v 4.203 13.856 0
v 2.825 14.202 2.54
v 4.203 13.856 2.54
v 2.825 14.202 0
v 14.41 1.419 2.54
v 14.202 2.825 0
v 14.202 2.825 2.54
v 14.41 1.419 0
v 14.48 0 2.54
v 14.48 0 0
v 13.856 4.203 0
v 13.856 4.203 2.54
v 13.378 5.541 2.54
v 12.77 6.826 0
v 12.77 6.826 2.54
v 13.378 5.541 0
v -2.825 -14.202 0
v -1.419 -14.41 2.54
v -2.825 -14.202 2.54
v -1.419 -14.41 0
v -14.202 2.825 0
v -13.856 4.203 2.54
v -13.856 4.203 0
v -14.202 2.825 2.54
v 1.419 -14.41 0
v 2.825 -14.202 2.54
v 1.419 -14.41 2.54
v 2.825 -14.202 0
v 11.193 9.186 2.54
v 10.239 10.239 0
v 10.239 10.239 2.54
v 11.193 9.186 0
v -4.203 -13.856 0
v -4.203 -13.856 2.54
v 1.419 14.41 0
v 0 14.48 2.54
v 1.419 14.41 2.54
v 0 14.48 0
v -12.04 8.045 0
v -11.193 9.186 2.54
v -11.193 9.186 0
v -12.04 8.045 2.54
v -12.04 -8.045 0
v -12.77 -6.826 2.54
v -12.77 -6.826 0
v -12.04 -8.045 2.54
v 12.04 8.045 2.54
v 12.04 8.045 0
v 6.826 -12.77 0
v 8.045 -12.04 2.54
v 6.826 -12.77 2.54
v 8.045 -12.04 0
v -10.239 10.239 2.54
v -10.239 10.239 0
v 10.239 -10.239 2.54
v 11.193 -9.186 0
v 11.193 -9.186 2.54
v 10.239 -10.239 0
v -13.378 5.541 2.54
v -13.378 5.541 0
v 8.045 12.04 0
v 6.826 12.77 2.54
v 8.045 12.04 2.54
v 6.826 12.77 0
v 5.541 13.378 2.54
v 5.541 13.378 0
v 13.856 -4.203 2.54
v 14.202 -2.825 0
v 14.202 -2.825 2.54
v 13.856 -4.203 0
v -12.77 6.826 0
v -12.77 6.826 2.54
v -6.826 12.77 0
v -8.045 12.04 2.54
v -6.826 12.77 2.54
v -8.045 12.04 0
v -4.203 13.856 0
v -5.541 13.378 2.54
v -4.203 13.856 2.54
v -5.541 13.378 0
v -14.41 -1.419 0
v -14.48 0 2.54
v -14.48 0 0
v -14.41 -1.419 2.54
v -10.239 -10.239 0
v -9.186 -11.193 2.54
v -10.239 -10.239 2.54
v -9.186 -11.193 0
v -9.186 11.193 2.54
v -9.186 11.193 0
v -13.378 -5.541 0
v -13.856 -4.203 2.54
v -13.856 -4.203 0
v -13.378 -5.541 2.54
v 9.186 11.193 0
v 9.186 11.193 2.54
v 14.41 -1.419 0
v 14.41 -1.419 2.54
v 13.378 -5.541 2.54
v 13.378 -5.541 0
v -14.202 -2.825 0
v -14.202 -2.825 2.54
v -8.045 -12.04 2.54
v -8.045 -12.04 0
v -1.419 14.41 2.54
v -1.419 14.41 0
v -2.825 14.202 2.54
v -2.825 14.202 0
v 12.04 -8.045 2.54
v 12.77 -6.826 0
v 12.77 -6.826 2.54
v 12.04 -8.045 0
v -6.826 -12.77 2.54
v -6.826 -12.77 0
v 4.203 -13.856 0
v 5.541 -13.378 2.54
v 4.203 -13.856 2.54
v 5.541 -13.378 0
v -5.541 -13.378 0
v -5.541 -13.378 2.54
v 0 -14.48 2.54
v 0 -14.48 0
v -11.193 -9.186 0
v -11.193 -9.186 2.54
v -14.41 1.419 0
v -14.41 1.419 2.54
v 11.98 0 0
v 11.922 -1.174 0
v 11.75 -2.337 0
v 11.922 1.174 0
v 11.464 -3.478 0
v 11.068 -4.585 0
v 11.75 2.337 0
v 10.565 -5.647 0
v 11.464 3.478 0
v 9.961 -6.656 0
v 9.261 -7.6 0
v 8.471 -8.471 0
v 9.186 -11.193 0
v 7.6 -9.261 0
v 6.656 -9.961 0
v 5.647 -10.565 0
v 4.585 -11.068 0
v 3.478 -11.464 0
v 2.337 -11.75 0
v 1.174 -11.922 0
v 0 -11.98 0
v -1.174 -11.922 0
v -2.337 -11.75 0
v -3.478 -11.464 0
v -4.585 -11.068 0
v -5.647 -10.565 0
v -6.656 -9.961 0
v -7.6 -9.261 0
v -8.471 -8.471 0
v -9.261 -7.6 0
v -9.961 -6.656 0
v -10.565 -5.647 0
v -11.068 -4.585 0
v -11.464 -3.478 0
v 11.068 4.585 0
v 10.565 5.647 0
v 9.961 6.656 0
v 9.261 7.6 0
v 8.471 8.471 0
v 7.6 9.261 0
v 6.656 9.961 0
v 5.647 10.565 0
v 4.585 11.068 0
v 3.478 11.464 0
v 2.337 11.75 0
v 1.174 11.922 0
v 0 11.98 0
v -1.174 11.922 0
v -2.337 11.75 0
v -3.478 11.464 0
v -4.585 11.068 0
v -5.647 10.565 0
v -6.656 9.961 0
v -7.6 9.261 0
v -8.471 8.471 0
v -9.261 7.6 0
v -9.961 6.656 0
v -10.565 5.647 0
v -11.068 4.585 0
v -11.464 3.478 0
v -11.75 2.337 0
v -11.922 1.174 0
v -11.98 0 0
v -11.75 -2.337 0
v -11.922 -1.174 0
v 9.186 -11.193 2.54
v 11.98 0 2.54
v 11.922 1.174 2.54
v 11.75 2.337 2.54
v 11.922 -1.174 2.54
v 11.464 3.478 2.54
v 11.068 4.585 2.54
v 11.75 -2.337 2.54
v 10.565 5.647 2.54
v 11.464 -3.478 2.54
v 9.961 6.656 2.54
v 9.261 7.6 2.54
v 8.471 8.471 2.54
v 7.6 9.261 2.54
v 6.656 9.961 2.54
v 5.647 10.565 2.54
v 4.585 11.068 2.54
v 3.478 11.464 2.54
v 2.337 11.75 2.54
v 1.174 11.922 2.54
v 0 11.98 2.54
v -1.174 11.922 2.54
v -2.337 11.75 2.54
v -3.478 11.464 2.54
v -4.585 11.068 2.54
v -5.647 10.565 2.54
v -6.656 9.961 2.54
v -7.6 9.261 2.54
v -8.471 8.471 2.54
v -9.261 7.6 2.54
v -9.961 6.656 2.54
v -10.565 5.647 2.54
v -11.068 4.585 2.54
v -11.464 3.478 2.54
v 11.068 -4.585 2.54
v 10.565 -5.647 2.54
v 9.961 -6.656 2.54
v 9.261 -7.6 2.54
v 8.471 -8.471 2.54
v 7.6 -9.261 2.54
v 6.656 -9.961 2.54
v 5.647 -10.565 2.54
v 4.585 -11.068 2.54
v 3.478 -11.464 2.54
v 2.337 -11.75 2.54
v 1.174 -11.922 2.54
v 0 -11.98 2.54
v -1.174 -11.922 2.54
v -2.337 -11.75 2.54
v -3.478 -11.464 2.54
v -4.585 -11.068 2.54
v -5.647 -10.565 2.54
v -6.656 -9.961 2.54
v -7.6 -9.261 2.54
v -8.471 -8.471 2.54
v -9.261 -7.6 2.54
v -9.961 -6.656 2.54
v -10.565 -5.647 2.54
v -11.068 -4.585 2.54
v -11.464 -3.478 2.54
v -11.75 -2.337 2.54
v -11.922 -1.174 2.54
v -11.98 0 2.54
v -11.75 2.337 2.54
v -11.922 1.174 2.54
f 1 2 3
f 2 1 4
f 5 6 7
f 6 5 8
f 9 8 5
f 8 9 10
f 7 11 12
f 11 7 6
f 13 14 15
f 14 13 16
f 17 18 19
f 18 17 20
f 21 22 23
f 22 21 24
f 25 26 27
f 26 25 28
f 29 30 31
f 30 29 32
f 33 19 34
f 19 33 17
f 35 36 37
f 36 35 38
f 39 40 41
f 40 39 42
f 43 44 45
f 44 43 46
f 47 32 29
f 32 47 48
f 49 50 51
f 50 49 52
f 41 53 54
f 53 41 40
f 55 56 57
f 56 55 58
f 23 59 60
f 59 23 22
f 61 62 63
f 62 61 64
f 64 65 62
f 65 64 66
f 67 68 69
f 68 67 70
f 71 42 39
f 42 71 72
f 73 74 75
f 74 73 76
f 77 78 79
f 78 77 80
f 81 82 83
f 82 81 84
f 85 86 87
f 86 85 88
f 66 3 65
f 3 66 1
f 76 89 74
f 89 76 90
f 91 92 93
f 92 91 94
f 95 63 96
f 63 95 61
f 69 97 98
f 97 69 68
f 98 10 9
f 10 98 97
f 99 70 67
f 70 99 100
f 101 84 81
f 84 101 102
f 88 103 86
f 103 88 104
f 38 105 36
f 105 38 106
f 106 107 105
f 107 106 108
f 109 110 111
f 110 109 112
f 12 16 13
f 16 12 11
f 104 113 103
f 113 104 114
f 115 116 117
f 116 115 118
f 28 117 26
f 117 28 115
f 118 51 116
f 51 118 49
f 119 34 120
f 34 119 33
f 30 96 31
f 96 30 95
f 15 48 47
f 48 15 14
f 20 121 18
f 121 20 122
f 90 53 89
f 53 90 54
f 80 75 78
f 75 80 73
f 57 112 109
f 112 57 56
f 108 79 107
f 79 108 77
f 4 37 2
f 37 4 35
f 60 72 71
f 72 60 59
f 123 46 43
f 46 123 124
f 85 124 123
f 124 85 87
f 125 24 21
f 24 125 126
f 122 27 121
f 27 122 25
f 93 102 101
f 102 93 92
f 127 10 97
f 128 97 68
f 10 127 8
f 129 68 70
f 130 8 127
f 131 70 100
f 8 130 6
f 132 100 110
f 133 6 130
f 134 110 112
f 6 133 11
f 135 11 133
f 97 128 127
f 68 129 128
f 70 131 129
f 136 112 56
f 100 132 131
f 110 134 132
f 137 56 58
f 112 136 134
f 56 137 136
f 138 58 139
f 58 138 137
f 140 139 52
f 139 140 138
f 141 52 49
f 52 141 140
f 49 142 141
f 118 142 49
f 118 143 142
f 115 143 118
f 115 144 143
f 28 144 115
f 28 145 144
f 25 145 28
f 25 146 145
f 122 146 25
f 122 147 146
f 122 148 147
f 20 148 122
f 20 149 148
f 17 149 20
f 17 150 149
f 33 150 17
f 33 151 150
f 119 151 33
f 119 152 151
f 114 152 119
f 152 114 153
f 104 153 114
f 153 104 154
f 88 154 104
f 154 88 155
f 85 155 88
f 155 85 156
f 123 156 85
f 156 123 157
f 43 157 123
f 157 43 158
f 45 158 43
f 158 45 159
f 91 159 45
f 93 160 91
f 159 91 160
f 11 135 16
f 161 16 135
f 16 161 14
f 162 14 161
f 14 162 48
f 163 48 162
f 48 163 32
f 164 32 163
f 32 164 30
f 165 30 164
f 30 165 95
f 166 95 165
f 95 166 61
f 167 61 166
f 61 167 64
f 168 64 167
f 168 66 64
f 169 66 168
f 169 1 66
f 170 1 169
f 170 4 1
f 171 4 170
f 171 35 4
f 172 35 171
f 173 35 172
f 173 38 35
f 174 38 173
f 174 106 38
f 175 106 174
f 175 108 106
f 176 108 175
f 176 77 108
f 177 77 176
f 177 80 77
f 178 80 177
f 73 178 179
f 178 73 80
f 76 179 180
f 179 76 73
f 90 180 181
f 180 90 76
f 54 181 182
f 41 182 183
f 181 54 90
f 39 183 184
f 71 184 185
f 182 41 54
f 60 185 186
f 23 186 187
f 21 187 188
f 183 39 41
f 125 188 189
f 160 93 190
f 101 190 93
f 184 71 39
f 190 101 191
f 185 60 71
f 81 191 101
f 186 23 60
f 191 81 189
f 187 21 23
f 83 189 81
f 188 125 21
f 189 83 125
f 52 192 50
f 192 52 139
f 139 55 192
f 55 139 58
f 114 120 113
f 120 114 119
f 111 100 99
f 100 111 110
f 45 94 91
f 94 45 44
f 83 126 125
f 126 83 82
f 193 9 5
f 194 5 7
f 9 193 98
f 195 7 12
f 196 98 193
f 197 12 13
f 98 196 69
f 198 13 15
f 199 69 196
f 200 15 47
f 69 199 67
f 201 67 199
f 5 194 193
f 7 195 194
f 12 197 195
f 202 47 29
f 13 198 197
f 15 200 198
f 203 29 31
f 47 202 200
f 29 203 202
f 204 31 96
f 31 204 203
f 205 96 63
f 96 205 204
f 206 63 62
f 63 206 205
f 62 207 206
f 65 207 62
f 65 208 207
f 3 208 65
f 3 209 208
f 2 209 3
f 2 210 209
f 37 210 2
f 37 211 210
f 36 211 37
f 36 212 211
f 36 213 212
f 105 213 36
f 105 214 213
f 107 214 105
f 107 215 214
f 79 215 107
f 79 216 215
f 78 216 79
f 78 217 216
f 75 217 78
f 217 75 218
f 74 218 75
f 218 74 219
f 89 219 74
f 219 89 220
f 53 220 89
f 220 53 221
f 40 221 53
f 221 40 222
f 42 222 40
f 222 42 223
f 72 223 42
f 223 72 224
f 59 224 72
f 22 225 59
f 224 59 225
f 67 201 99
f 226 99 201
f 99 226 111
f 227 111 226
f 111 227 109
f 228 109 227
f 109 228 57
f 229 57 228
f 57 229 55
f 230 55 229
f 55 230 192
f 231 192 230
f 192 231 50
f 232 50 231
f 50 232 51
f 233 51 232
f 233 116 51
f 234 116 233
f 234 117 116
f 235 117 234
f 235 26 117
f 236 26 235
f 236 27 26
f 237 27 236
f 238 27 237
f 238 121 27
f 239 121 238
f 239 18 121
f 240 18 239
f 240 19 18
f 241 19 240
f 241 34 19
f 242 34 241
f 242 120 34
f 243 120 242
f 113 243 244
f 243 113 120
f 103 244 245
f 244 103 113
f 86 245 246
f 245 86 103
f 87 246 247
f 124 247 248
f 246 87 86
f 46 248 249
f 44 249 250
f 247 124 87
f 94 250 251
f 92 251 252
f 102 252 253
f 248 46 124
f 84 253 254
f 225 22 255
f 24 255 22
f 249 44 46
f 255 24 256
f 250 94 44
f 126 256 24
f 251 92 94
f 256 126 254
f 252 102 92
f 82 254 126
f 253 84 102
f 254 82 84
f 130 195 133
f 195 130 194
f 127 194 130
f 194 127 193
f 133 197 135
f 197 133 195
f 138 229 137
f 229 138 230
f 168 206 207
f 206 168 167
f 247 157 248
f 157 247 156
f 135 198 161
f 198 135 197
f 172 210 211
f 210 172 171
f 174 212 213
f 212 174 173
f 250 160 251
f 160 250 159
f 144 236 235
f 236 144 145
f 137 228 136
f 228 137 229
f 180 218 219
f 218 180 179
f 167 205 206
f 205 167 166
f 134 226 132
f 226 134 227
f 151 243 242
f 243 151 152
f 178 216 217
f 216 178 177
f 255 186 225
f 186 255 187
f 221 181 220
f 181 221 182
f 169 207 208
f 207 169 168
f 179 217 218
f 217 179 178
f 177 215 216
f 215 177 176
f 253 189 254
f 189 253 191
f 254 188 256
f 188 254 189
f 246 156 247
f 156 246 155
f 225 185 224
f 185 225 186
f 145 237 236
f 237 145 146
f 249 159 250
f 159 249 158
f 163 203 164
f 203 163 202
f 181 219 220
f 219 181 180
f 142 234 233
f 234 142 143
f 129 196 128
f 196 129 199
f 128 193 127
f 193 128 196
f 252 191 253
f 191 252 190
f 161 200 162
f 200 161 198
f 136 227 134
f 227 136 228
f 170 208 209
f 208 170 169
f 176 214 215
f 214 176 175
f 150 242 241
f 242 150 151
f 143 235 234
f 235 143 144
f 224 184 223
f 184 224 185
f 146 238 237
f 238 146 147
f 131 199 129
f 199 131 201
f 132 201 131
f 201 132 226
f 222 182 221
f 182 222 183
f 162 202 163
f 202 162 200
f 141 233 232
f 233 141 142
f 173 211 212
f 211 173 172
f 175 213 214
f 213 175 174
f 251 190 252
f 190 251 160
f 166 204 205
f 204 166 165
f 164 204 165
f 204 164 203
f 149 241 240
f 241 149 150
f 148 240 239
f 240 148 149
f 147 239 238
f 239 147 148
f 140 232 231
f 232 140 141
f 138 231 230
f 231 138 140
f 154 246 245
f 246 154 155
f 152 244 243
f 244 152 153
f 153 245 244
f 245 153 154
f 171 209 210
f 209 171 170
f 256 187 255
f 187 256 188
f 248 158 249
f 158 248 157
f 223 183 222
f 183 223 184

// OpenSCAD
// file: Fins.scad
include <Variables.scad>

// A Test to show the fin data was imported properly
//finForFinCan();

module finPolygon()
{
    // X is the width of the svg, y is the height of the svg
    translate(v = [finLength / 2, finSemiSpan / 2, 0])
    {
        scale([25.4 / 90, -25.4 / 90, 1]) 
        {
            polygon(finPoints);
        }
    }
}

module finCan(finCanLength = 50.8, finCanInsideDiameter = 28.96, finCanWallThickness = 0.885, finCount = 3, launchLugInsideDiameter = 3, launchLugWallThickness = 0.5, launchLugPieceLength = 10, launchLugNumberOfPieces = 2, launchLugWallThicknessOffsetPercentage = 100)
{
    // Calculate some distances
    launchLugTotalLength = launchLugNumberOfPieces * launchLugPieceLength;
    launchLugTotalGapLength = finCanLength - launchLugTotalLength;
    launchLugNumberOfGaps = (launchLugNumberOfPieces - 1);
    gapBetweenLaunchLugPieces = launchLugTotalGapLength / (launchLugNumberOfPieces - 1);
    
    difference()
    {
        union()
        {
            // Create the fin can
            cylinder(h = finCanLength, r = finCanInsideDiameter / 2 + finCanWallThickness);
            
            // Create the fins
            for(i = [0 : finCount - 1])
            {
                rotate([0, 0, i * (360 / finCount)])
                {
                    translate(v = [finCanInsideDiameter / 2 + finCanWallThickness, 0, 0])
                    {
                        finForFinCan(finDXFFileName = finFileName);
                    }
                }
            }
            
            // Add the launch lug
            for(i = [0 : launchLugNumberOfPieces - 1])
            {
                // Rotate the lug inbetween the fins
                rotate([0, 0, 180 / finCount])
                {
                    // Move the lug to the edge of the fin can + the offset
                    translate([finCanInsideDiameter / 2 + finCanWallThickness + launchLugInsideDiameter / 2 + (launchLugWallThicknessOffsetPercentage / 100) * launchLugWallThickness - offsetMargin, 0, i * gapBetweenLaunchLugPieces + i * launchLugPieceLength])
                    {
                        difference()
                        {
                            // Launch Lug Body
                            cylinder(h = launchLugPieceLength, r = launchLugInsideDiameter / 2 + launchLugWallThickness);
                            
                            // Launch lug cutout
                            translate(v = [0, 0, -offsetMargin])
                            {
                                cylinder(h = launchLugPieceLength + 2 * offsetMargin, r = launchLugInsideDiameter / 2);
                            }
                        }
                    }
                }
            }
        }
        
        // Fin can cutout
        translate(v = [0, 0, -offsetMargin])
        {
            cylinder(h = finCanLength + 2 * offsetMargin, r = finCanInsideDiameter / 2);
        }
    }
}

module finForFinCan(finThickness = 1)
{
    translate(v = [-offsetMargin, finThickness / 2, finRootChordLength])
    {
        rotate(a = [90, 90, 0])
        {
            linear_extrude(height = finThickness)
            {
                finPolygon();
            }
        }
    }
}

module finsForPrinting(finThickness = 1, finCount = 4, finXSpacing = 25, finYSpacing = 25, maxFinsInXDirection = 2, maxFinsInYDirection = 2, finLayout = [[1, 1], [1, 1]])
{
    for(i = [0 : maxFinsInXDirection - 1])
    {
        for(i2 = [0 : maxFinsInYDirection - 1])
        {
//            echo("i2", i2);
//            echo("i", i);
//            echo("finLayout[][]:", finLayout[i2][i]);
            if(finLayout[i2][i] == 1 || finLayout == true)
            {
                translate(v = [i * finXSpacing, i2 * finYSpacing, 0])
                {
                    linear_extrude(height = finThickness)
                    {
                        finPolygon();
                    }
                }
            }
        }
    }
}
// file: NoseCone.scad
include <Variables.scad>

// A Test to show the nose cone was imported properly
/*rotate_extrude(convexity = 10)
{
    noseConePolygon();
}*/

module noseConePolygon()
{
    // Rotate to the proper orientation for a rotate_extrude
    rotate(a = [180, 180, 90])
    {
        // X is the width of the svg, y is the height of the svg
        translate(v = [-noseConeTotalLength / 2, noseConeWidth / 4, 0])
        {
            scale([25.4 / 90, -25.4 / 90, 1]) 
            {
                polygon(noseConePoints);
            }
        }
    }
}

module noseCone(wallThickness = 1.17, addParachuteAttachmentHook = true, parachuteAttachmentHookSize = 5.0)
{
    scalePercentage = (noseConeWidth / 2 - wallThickness) / (noseConeWidth / 2);
    
    union()
    {
        // Create the nose cone
        difference()
        {
            // Create the nose Cone
            rotate_extrude(convexity = 10)
            {
                noseConePolygon();
            }
            
            // Cutout the inside of the nose cone
            rotate_extrude(convexity = 10)
            {
                scale([scalePercentage, scalePercentage, scalePercentage])
                {
                    noseConePolygon();
                }
            }
            
            // Cutout plength of shoulder length so a clean bottom can be added back in
            translate(v = [0, 0, -offsetMargin])
            {
                cylinder(r = noseConeShoulderWidth / 2 - wallThickness, h = wallThickness + 2 * offsetMargin);
            }
        }
        
        
        // Create the bottom face of the nose cone
        difference()
        {
            // Add back the bottom of the nose cone
            cylinder(r = noseConeShoulderWidth / 2, h = wallThickness);
            
            // Create the cutout for the parachuteHook
            if(addParachuteAttachmentHook)
            {
                translate(v = [0, 0, -offsetMargin])
                {
                    cylinder(r = parachuteAttachmentHookSize / 2, h = wallThickness + 2 * offsetMargin);
                }
            }
        }
        
        // Create the parachute attatchment hook
        if(addParachuteAttachmentHook)
        {
            // Move the hook on top of the bottom plate
            translate(v = [0, wallThickness / 2, 0])
            {
                rotate(a = [90, 0, 0])
                {
                    difference()
                    {
                        // Create the main cylinder
                        translate(v = [0, wallThickness, 0])
                        {
                            cylinder(r = parachuteAttachmentHookSize / 2 + wallThickness, h = wallThickness);
                        }
                        
                        // Main cylinder cutout
                        translate(v = [0, wallThickness, -offsetMargin])
                        {
                            cylinder(r = parachuteAttachmentHookSize / 2, h = wallThickness + 2 * offsetMargin);
                        }
                        // Cut off the bottom of the cylinder
                        translate(v = [-parachuteAttachmentHookSize - wallThickness - offsetMargin, -parachuteAttachmentHookSize - wallThickness - offsetMargin, -offsetMargin])
                        {
                            cube(size = [parachuteAttachmentHookSize * 2 + wallThickness * 2 + offsetMargin * 2, parachuteAttachmentHookSize + 2 * wallThickness + offsetMargin, wallThickness + 2 * offsetMargin]);
                        }
                    }
                }
            }
        }
    }
}
// main file
include <Variables.scad>
include <NoseCone.scad>
include <Fins.scad>

//translate(v = [0, 0, 32]) noseCone();
//bodyTube();
//finCan();
//finsForPrinting(finThickness = finThickness, finXSpacing = finLength  / 2, finYSpacing = finSemiSpan / 2, maxFinsInXDirection = 2, maxFinsInYDirection = 4, finLayout = [[1, 1], [1, 0], [1, 0], [1, 0]]);
//coupler();
centeringRing();

module bodyTube(tubeLength = 100, tubeInsideDiameter = 28.96, tubeWallThickness = 0.885)
{
    difference()
    {
        cylinder(r = tubeInsideDiameter / 2 + tubeWallThickness, h = tubeLength);
        
        translate(v = [0, 0, -offsetMargin])
        {
            cylinder(r = tubeInsideDiameter / 2, h = tubeLength + 2 * offsetMargin);
        }
    }
}

module coupler(couplerOutsideDiameter = 28.96, couplerWallThickness = 1.0, couplerLength = 57.92, centerMark = true)
{
    centerMarkLength = 0.25;
    centerMarkDepth = 0.15;
    
    difference()
    {
        // Main Coupler Body
        cylinder(r = couplerOutsideDiameter / 2, h = couplerLength);
        
        // Coupler Inside Cutout
        translate(v = [0, 0, -offsetMargin])
        {
            cylinder(r = couplerOutsideDiameter / 2 - couplerWallThickness, h = couplerLength + 2 * offsetMargin);
        }
        
        // Center Mark
        if(centerMark == true)
        {
            translate(v = [0, 0, couplerLength / 2 - centerMarkLength / 2])
            {
                difference()
                {
                    // Main Center Mark Cylinder
                    cylinder(r = couplerOutsideDiameter / 2 + offsetMargin, h = centerMarkLength);
                    
                    // Center Mark Center Cutout
                    translate(v = [0, 0, -offsetMargin])
                    {
                        cylinder(r = couplerOutsideDiameter / 2 - centerMarkDepth, h = centerMarkLength + 2 * offsetMargin);
                    }
                }
            }
        }
    }
}

module centeringRing(centeringRingOutsideDiameter = 28.96, centeringRingInsideDiameter = 23.96, centeringRingThickness = 2.54)
{
    difference()
    {
        cylinder(r = centeringRingOutsideDiameter / 2, h = centeringRingThickness);
        
        translate(v = [0, 0, -offsetMargin])
        {
            cylinder(r = centeringRingInsideDiameter / 2, h = centeringRingThickness + 2 * offsetMargin);
        }
    }
}
